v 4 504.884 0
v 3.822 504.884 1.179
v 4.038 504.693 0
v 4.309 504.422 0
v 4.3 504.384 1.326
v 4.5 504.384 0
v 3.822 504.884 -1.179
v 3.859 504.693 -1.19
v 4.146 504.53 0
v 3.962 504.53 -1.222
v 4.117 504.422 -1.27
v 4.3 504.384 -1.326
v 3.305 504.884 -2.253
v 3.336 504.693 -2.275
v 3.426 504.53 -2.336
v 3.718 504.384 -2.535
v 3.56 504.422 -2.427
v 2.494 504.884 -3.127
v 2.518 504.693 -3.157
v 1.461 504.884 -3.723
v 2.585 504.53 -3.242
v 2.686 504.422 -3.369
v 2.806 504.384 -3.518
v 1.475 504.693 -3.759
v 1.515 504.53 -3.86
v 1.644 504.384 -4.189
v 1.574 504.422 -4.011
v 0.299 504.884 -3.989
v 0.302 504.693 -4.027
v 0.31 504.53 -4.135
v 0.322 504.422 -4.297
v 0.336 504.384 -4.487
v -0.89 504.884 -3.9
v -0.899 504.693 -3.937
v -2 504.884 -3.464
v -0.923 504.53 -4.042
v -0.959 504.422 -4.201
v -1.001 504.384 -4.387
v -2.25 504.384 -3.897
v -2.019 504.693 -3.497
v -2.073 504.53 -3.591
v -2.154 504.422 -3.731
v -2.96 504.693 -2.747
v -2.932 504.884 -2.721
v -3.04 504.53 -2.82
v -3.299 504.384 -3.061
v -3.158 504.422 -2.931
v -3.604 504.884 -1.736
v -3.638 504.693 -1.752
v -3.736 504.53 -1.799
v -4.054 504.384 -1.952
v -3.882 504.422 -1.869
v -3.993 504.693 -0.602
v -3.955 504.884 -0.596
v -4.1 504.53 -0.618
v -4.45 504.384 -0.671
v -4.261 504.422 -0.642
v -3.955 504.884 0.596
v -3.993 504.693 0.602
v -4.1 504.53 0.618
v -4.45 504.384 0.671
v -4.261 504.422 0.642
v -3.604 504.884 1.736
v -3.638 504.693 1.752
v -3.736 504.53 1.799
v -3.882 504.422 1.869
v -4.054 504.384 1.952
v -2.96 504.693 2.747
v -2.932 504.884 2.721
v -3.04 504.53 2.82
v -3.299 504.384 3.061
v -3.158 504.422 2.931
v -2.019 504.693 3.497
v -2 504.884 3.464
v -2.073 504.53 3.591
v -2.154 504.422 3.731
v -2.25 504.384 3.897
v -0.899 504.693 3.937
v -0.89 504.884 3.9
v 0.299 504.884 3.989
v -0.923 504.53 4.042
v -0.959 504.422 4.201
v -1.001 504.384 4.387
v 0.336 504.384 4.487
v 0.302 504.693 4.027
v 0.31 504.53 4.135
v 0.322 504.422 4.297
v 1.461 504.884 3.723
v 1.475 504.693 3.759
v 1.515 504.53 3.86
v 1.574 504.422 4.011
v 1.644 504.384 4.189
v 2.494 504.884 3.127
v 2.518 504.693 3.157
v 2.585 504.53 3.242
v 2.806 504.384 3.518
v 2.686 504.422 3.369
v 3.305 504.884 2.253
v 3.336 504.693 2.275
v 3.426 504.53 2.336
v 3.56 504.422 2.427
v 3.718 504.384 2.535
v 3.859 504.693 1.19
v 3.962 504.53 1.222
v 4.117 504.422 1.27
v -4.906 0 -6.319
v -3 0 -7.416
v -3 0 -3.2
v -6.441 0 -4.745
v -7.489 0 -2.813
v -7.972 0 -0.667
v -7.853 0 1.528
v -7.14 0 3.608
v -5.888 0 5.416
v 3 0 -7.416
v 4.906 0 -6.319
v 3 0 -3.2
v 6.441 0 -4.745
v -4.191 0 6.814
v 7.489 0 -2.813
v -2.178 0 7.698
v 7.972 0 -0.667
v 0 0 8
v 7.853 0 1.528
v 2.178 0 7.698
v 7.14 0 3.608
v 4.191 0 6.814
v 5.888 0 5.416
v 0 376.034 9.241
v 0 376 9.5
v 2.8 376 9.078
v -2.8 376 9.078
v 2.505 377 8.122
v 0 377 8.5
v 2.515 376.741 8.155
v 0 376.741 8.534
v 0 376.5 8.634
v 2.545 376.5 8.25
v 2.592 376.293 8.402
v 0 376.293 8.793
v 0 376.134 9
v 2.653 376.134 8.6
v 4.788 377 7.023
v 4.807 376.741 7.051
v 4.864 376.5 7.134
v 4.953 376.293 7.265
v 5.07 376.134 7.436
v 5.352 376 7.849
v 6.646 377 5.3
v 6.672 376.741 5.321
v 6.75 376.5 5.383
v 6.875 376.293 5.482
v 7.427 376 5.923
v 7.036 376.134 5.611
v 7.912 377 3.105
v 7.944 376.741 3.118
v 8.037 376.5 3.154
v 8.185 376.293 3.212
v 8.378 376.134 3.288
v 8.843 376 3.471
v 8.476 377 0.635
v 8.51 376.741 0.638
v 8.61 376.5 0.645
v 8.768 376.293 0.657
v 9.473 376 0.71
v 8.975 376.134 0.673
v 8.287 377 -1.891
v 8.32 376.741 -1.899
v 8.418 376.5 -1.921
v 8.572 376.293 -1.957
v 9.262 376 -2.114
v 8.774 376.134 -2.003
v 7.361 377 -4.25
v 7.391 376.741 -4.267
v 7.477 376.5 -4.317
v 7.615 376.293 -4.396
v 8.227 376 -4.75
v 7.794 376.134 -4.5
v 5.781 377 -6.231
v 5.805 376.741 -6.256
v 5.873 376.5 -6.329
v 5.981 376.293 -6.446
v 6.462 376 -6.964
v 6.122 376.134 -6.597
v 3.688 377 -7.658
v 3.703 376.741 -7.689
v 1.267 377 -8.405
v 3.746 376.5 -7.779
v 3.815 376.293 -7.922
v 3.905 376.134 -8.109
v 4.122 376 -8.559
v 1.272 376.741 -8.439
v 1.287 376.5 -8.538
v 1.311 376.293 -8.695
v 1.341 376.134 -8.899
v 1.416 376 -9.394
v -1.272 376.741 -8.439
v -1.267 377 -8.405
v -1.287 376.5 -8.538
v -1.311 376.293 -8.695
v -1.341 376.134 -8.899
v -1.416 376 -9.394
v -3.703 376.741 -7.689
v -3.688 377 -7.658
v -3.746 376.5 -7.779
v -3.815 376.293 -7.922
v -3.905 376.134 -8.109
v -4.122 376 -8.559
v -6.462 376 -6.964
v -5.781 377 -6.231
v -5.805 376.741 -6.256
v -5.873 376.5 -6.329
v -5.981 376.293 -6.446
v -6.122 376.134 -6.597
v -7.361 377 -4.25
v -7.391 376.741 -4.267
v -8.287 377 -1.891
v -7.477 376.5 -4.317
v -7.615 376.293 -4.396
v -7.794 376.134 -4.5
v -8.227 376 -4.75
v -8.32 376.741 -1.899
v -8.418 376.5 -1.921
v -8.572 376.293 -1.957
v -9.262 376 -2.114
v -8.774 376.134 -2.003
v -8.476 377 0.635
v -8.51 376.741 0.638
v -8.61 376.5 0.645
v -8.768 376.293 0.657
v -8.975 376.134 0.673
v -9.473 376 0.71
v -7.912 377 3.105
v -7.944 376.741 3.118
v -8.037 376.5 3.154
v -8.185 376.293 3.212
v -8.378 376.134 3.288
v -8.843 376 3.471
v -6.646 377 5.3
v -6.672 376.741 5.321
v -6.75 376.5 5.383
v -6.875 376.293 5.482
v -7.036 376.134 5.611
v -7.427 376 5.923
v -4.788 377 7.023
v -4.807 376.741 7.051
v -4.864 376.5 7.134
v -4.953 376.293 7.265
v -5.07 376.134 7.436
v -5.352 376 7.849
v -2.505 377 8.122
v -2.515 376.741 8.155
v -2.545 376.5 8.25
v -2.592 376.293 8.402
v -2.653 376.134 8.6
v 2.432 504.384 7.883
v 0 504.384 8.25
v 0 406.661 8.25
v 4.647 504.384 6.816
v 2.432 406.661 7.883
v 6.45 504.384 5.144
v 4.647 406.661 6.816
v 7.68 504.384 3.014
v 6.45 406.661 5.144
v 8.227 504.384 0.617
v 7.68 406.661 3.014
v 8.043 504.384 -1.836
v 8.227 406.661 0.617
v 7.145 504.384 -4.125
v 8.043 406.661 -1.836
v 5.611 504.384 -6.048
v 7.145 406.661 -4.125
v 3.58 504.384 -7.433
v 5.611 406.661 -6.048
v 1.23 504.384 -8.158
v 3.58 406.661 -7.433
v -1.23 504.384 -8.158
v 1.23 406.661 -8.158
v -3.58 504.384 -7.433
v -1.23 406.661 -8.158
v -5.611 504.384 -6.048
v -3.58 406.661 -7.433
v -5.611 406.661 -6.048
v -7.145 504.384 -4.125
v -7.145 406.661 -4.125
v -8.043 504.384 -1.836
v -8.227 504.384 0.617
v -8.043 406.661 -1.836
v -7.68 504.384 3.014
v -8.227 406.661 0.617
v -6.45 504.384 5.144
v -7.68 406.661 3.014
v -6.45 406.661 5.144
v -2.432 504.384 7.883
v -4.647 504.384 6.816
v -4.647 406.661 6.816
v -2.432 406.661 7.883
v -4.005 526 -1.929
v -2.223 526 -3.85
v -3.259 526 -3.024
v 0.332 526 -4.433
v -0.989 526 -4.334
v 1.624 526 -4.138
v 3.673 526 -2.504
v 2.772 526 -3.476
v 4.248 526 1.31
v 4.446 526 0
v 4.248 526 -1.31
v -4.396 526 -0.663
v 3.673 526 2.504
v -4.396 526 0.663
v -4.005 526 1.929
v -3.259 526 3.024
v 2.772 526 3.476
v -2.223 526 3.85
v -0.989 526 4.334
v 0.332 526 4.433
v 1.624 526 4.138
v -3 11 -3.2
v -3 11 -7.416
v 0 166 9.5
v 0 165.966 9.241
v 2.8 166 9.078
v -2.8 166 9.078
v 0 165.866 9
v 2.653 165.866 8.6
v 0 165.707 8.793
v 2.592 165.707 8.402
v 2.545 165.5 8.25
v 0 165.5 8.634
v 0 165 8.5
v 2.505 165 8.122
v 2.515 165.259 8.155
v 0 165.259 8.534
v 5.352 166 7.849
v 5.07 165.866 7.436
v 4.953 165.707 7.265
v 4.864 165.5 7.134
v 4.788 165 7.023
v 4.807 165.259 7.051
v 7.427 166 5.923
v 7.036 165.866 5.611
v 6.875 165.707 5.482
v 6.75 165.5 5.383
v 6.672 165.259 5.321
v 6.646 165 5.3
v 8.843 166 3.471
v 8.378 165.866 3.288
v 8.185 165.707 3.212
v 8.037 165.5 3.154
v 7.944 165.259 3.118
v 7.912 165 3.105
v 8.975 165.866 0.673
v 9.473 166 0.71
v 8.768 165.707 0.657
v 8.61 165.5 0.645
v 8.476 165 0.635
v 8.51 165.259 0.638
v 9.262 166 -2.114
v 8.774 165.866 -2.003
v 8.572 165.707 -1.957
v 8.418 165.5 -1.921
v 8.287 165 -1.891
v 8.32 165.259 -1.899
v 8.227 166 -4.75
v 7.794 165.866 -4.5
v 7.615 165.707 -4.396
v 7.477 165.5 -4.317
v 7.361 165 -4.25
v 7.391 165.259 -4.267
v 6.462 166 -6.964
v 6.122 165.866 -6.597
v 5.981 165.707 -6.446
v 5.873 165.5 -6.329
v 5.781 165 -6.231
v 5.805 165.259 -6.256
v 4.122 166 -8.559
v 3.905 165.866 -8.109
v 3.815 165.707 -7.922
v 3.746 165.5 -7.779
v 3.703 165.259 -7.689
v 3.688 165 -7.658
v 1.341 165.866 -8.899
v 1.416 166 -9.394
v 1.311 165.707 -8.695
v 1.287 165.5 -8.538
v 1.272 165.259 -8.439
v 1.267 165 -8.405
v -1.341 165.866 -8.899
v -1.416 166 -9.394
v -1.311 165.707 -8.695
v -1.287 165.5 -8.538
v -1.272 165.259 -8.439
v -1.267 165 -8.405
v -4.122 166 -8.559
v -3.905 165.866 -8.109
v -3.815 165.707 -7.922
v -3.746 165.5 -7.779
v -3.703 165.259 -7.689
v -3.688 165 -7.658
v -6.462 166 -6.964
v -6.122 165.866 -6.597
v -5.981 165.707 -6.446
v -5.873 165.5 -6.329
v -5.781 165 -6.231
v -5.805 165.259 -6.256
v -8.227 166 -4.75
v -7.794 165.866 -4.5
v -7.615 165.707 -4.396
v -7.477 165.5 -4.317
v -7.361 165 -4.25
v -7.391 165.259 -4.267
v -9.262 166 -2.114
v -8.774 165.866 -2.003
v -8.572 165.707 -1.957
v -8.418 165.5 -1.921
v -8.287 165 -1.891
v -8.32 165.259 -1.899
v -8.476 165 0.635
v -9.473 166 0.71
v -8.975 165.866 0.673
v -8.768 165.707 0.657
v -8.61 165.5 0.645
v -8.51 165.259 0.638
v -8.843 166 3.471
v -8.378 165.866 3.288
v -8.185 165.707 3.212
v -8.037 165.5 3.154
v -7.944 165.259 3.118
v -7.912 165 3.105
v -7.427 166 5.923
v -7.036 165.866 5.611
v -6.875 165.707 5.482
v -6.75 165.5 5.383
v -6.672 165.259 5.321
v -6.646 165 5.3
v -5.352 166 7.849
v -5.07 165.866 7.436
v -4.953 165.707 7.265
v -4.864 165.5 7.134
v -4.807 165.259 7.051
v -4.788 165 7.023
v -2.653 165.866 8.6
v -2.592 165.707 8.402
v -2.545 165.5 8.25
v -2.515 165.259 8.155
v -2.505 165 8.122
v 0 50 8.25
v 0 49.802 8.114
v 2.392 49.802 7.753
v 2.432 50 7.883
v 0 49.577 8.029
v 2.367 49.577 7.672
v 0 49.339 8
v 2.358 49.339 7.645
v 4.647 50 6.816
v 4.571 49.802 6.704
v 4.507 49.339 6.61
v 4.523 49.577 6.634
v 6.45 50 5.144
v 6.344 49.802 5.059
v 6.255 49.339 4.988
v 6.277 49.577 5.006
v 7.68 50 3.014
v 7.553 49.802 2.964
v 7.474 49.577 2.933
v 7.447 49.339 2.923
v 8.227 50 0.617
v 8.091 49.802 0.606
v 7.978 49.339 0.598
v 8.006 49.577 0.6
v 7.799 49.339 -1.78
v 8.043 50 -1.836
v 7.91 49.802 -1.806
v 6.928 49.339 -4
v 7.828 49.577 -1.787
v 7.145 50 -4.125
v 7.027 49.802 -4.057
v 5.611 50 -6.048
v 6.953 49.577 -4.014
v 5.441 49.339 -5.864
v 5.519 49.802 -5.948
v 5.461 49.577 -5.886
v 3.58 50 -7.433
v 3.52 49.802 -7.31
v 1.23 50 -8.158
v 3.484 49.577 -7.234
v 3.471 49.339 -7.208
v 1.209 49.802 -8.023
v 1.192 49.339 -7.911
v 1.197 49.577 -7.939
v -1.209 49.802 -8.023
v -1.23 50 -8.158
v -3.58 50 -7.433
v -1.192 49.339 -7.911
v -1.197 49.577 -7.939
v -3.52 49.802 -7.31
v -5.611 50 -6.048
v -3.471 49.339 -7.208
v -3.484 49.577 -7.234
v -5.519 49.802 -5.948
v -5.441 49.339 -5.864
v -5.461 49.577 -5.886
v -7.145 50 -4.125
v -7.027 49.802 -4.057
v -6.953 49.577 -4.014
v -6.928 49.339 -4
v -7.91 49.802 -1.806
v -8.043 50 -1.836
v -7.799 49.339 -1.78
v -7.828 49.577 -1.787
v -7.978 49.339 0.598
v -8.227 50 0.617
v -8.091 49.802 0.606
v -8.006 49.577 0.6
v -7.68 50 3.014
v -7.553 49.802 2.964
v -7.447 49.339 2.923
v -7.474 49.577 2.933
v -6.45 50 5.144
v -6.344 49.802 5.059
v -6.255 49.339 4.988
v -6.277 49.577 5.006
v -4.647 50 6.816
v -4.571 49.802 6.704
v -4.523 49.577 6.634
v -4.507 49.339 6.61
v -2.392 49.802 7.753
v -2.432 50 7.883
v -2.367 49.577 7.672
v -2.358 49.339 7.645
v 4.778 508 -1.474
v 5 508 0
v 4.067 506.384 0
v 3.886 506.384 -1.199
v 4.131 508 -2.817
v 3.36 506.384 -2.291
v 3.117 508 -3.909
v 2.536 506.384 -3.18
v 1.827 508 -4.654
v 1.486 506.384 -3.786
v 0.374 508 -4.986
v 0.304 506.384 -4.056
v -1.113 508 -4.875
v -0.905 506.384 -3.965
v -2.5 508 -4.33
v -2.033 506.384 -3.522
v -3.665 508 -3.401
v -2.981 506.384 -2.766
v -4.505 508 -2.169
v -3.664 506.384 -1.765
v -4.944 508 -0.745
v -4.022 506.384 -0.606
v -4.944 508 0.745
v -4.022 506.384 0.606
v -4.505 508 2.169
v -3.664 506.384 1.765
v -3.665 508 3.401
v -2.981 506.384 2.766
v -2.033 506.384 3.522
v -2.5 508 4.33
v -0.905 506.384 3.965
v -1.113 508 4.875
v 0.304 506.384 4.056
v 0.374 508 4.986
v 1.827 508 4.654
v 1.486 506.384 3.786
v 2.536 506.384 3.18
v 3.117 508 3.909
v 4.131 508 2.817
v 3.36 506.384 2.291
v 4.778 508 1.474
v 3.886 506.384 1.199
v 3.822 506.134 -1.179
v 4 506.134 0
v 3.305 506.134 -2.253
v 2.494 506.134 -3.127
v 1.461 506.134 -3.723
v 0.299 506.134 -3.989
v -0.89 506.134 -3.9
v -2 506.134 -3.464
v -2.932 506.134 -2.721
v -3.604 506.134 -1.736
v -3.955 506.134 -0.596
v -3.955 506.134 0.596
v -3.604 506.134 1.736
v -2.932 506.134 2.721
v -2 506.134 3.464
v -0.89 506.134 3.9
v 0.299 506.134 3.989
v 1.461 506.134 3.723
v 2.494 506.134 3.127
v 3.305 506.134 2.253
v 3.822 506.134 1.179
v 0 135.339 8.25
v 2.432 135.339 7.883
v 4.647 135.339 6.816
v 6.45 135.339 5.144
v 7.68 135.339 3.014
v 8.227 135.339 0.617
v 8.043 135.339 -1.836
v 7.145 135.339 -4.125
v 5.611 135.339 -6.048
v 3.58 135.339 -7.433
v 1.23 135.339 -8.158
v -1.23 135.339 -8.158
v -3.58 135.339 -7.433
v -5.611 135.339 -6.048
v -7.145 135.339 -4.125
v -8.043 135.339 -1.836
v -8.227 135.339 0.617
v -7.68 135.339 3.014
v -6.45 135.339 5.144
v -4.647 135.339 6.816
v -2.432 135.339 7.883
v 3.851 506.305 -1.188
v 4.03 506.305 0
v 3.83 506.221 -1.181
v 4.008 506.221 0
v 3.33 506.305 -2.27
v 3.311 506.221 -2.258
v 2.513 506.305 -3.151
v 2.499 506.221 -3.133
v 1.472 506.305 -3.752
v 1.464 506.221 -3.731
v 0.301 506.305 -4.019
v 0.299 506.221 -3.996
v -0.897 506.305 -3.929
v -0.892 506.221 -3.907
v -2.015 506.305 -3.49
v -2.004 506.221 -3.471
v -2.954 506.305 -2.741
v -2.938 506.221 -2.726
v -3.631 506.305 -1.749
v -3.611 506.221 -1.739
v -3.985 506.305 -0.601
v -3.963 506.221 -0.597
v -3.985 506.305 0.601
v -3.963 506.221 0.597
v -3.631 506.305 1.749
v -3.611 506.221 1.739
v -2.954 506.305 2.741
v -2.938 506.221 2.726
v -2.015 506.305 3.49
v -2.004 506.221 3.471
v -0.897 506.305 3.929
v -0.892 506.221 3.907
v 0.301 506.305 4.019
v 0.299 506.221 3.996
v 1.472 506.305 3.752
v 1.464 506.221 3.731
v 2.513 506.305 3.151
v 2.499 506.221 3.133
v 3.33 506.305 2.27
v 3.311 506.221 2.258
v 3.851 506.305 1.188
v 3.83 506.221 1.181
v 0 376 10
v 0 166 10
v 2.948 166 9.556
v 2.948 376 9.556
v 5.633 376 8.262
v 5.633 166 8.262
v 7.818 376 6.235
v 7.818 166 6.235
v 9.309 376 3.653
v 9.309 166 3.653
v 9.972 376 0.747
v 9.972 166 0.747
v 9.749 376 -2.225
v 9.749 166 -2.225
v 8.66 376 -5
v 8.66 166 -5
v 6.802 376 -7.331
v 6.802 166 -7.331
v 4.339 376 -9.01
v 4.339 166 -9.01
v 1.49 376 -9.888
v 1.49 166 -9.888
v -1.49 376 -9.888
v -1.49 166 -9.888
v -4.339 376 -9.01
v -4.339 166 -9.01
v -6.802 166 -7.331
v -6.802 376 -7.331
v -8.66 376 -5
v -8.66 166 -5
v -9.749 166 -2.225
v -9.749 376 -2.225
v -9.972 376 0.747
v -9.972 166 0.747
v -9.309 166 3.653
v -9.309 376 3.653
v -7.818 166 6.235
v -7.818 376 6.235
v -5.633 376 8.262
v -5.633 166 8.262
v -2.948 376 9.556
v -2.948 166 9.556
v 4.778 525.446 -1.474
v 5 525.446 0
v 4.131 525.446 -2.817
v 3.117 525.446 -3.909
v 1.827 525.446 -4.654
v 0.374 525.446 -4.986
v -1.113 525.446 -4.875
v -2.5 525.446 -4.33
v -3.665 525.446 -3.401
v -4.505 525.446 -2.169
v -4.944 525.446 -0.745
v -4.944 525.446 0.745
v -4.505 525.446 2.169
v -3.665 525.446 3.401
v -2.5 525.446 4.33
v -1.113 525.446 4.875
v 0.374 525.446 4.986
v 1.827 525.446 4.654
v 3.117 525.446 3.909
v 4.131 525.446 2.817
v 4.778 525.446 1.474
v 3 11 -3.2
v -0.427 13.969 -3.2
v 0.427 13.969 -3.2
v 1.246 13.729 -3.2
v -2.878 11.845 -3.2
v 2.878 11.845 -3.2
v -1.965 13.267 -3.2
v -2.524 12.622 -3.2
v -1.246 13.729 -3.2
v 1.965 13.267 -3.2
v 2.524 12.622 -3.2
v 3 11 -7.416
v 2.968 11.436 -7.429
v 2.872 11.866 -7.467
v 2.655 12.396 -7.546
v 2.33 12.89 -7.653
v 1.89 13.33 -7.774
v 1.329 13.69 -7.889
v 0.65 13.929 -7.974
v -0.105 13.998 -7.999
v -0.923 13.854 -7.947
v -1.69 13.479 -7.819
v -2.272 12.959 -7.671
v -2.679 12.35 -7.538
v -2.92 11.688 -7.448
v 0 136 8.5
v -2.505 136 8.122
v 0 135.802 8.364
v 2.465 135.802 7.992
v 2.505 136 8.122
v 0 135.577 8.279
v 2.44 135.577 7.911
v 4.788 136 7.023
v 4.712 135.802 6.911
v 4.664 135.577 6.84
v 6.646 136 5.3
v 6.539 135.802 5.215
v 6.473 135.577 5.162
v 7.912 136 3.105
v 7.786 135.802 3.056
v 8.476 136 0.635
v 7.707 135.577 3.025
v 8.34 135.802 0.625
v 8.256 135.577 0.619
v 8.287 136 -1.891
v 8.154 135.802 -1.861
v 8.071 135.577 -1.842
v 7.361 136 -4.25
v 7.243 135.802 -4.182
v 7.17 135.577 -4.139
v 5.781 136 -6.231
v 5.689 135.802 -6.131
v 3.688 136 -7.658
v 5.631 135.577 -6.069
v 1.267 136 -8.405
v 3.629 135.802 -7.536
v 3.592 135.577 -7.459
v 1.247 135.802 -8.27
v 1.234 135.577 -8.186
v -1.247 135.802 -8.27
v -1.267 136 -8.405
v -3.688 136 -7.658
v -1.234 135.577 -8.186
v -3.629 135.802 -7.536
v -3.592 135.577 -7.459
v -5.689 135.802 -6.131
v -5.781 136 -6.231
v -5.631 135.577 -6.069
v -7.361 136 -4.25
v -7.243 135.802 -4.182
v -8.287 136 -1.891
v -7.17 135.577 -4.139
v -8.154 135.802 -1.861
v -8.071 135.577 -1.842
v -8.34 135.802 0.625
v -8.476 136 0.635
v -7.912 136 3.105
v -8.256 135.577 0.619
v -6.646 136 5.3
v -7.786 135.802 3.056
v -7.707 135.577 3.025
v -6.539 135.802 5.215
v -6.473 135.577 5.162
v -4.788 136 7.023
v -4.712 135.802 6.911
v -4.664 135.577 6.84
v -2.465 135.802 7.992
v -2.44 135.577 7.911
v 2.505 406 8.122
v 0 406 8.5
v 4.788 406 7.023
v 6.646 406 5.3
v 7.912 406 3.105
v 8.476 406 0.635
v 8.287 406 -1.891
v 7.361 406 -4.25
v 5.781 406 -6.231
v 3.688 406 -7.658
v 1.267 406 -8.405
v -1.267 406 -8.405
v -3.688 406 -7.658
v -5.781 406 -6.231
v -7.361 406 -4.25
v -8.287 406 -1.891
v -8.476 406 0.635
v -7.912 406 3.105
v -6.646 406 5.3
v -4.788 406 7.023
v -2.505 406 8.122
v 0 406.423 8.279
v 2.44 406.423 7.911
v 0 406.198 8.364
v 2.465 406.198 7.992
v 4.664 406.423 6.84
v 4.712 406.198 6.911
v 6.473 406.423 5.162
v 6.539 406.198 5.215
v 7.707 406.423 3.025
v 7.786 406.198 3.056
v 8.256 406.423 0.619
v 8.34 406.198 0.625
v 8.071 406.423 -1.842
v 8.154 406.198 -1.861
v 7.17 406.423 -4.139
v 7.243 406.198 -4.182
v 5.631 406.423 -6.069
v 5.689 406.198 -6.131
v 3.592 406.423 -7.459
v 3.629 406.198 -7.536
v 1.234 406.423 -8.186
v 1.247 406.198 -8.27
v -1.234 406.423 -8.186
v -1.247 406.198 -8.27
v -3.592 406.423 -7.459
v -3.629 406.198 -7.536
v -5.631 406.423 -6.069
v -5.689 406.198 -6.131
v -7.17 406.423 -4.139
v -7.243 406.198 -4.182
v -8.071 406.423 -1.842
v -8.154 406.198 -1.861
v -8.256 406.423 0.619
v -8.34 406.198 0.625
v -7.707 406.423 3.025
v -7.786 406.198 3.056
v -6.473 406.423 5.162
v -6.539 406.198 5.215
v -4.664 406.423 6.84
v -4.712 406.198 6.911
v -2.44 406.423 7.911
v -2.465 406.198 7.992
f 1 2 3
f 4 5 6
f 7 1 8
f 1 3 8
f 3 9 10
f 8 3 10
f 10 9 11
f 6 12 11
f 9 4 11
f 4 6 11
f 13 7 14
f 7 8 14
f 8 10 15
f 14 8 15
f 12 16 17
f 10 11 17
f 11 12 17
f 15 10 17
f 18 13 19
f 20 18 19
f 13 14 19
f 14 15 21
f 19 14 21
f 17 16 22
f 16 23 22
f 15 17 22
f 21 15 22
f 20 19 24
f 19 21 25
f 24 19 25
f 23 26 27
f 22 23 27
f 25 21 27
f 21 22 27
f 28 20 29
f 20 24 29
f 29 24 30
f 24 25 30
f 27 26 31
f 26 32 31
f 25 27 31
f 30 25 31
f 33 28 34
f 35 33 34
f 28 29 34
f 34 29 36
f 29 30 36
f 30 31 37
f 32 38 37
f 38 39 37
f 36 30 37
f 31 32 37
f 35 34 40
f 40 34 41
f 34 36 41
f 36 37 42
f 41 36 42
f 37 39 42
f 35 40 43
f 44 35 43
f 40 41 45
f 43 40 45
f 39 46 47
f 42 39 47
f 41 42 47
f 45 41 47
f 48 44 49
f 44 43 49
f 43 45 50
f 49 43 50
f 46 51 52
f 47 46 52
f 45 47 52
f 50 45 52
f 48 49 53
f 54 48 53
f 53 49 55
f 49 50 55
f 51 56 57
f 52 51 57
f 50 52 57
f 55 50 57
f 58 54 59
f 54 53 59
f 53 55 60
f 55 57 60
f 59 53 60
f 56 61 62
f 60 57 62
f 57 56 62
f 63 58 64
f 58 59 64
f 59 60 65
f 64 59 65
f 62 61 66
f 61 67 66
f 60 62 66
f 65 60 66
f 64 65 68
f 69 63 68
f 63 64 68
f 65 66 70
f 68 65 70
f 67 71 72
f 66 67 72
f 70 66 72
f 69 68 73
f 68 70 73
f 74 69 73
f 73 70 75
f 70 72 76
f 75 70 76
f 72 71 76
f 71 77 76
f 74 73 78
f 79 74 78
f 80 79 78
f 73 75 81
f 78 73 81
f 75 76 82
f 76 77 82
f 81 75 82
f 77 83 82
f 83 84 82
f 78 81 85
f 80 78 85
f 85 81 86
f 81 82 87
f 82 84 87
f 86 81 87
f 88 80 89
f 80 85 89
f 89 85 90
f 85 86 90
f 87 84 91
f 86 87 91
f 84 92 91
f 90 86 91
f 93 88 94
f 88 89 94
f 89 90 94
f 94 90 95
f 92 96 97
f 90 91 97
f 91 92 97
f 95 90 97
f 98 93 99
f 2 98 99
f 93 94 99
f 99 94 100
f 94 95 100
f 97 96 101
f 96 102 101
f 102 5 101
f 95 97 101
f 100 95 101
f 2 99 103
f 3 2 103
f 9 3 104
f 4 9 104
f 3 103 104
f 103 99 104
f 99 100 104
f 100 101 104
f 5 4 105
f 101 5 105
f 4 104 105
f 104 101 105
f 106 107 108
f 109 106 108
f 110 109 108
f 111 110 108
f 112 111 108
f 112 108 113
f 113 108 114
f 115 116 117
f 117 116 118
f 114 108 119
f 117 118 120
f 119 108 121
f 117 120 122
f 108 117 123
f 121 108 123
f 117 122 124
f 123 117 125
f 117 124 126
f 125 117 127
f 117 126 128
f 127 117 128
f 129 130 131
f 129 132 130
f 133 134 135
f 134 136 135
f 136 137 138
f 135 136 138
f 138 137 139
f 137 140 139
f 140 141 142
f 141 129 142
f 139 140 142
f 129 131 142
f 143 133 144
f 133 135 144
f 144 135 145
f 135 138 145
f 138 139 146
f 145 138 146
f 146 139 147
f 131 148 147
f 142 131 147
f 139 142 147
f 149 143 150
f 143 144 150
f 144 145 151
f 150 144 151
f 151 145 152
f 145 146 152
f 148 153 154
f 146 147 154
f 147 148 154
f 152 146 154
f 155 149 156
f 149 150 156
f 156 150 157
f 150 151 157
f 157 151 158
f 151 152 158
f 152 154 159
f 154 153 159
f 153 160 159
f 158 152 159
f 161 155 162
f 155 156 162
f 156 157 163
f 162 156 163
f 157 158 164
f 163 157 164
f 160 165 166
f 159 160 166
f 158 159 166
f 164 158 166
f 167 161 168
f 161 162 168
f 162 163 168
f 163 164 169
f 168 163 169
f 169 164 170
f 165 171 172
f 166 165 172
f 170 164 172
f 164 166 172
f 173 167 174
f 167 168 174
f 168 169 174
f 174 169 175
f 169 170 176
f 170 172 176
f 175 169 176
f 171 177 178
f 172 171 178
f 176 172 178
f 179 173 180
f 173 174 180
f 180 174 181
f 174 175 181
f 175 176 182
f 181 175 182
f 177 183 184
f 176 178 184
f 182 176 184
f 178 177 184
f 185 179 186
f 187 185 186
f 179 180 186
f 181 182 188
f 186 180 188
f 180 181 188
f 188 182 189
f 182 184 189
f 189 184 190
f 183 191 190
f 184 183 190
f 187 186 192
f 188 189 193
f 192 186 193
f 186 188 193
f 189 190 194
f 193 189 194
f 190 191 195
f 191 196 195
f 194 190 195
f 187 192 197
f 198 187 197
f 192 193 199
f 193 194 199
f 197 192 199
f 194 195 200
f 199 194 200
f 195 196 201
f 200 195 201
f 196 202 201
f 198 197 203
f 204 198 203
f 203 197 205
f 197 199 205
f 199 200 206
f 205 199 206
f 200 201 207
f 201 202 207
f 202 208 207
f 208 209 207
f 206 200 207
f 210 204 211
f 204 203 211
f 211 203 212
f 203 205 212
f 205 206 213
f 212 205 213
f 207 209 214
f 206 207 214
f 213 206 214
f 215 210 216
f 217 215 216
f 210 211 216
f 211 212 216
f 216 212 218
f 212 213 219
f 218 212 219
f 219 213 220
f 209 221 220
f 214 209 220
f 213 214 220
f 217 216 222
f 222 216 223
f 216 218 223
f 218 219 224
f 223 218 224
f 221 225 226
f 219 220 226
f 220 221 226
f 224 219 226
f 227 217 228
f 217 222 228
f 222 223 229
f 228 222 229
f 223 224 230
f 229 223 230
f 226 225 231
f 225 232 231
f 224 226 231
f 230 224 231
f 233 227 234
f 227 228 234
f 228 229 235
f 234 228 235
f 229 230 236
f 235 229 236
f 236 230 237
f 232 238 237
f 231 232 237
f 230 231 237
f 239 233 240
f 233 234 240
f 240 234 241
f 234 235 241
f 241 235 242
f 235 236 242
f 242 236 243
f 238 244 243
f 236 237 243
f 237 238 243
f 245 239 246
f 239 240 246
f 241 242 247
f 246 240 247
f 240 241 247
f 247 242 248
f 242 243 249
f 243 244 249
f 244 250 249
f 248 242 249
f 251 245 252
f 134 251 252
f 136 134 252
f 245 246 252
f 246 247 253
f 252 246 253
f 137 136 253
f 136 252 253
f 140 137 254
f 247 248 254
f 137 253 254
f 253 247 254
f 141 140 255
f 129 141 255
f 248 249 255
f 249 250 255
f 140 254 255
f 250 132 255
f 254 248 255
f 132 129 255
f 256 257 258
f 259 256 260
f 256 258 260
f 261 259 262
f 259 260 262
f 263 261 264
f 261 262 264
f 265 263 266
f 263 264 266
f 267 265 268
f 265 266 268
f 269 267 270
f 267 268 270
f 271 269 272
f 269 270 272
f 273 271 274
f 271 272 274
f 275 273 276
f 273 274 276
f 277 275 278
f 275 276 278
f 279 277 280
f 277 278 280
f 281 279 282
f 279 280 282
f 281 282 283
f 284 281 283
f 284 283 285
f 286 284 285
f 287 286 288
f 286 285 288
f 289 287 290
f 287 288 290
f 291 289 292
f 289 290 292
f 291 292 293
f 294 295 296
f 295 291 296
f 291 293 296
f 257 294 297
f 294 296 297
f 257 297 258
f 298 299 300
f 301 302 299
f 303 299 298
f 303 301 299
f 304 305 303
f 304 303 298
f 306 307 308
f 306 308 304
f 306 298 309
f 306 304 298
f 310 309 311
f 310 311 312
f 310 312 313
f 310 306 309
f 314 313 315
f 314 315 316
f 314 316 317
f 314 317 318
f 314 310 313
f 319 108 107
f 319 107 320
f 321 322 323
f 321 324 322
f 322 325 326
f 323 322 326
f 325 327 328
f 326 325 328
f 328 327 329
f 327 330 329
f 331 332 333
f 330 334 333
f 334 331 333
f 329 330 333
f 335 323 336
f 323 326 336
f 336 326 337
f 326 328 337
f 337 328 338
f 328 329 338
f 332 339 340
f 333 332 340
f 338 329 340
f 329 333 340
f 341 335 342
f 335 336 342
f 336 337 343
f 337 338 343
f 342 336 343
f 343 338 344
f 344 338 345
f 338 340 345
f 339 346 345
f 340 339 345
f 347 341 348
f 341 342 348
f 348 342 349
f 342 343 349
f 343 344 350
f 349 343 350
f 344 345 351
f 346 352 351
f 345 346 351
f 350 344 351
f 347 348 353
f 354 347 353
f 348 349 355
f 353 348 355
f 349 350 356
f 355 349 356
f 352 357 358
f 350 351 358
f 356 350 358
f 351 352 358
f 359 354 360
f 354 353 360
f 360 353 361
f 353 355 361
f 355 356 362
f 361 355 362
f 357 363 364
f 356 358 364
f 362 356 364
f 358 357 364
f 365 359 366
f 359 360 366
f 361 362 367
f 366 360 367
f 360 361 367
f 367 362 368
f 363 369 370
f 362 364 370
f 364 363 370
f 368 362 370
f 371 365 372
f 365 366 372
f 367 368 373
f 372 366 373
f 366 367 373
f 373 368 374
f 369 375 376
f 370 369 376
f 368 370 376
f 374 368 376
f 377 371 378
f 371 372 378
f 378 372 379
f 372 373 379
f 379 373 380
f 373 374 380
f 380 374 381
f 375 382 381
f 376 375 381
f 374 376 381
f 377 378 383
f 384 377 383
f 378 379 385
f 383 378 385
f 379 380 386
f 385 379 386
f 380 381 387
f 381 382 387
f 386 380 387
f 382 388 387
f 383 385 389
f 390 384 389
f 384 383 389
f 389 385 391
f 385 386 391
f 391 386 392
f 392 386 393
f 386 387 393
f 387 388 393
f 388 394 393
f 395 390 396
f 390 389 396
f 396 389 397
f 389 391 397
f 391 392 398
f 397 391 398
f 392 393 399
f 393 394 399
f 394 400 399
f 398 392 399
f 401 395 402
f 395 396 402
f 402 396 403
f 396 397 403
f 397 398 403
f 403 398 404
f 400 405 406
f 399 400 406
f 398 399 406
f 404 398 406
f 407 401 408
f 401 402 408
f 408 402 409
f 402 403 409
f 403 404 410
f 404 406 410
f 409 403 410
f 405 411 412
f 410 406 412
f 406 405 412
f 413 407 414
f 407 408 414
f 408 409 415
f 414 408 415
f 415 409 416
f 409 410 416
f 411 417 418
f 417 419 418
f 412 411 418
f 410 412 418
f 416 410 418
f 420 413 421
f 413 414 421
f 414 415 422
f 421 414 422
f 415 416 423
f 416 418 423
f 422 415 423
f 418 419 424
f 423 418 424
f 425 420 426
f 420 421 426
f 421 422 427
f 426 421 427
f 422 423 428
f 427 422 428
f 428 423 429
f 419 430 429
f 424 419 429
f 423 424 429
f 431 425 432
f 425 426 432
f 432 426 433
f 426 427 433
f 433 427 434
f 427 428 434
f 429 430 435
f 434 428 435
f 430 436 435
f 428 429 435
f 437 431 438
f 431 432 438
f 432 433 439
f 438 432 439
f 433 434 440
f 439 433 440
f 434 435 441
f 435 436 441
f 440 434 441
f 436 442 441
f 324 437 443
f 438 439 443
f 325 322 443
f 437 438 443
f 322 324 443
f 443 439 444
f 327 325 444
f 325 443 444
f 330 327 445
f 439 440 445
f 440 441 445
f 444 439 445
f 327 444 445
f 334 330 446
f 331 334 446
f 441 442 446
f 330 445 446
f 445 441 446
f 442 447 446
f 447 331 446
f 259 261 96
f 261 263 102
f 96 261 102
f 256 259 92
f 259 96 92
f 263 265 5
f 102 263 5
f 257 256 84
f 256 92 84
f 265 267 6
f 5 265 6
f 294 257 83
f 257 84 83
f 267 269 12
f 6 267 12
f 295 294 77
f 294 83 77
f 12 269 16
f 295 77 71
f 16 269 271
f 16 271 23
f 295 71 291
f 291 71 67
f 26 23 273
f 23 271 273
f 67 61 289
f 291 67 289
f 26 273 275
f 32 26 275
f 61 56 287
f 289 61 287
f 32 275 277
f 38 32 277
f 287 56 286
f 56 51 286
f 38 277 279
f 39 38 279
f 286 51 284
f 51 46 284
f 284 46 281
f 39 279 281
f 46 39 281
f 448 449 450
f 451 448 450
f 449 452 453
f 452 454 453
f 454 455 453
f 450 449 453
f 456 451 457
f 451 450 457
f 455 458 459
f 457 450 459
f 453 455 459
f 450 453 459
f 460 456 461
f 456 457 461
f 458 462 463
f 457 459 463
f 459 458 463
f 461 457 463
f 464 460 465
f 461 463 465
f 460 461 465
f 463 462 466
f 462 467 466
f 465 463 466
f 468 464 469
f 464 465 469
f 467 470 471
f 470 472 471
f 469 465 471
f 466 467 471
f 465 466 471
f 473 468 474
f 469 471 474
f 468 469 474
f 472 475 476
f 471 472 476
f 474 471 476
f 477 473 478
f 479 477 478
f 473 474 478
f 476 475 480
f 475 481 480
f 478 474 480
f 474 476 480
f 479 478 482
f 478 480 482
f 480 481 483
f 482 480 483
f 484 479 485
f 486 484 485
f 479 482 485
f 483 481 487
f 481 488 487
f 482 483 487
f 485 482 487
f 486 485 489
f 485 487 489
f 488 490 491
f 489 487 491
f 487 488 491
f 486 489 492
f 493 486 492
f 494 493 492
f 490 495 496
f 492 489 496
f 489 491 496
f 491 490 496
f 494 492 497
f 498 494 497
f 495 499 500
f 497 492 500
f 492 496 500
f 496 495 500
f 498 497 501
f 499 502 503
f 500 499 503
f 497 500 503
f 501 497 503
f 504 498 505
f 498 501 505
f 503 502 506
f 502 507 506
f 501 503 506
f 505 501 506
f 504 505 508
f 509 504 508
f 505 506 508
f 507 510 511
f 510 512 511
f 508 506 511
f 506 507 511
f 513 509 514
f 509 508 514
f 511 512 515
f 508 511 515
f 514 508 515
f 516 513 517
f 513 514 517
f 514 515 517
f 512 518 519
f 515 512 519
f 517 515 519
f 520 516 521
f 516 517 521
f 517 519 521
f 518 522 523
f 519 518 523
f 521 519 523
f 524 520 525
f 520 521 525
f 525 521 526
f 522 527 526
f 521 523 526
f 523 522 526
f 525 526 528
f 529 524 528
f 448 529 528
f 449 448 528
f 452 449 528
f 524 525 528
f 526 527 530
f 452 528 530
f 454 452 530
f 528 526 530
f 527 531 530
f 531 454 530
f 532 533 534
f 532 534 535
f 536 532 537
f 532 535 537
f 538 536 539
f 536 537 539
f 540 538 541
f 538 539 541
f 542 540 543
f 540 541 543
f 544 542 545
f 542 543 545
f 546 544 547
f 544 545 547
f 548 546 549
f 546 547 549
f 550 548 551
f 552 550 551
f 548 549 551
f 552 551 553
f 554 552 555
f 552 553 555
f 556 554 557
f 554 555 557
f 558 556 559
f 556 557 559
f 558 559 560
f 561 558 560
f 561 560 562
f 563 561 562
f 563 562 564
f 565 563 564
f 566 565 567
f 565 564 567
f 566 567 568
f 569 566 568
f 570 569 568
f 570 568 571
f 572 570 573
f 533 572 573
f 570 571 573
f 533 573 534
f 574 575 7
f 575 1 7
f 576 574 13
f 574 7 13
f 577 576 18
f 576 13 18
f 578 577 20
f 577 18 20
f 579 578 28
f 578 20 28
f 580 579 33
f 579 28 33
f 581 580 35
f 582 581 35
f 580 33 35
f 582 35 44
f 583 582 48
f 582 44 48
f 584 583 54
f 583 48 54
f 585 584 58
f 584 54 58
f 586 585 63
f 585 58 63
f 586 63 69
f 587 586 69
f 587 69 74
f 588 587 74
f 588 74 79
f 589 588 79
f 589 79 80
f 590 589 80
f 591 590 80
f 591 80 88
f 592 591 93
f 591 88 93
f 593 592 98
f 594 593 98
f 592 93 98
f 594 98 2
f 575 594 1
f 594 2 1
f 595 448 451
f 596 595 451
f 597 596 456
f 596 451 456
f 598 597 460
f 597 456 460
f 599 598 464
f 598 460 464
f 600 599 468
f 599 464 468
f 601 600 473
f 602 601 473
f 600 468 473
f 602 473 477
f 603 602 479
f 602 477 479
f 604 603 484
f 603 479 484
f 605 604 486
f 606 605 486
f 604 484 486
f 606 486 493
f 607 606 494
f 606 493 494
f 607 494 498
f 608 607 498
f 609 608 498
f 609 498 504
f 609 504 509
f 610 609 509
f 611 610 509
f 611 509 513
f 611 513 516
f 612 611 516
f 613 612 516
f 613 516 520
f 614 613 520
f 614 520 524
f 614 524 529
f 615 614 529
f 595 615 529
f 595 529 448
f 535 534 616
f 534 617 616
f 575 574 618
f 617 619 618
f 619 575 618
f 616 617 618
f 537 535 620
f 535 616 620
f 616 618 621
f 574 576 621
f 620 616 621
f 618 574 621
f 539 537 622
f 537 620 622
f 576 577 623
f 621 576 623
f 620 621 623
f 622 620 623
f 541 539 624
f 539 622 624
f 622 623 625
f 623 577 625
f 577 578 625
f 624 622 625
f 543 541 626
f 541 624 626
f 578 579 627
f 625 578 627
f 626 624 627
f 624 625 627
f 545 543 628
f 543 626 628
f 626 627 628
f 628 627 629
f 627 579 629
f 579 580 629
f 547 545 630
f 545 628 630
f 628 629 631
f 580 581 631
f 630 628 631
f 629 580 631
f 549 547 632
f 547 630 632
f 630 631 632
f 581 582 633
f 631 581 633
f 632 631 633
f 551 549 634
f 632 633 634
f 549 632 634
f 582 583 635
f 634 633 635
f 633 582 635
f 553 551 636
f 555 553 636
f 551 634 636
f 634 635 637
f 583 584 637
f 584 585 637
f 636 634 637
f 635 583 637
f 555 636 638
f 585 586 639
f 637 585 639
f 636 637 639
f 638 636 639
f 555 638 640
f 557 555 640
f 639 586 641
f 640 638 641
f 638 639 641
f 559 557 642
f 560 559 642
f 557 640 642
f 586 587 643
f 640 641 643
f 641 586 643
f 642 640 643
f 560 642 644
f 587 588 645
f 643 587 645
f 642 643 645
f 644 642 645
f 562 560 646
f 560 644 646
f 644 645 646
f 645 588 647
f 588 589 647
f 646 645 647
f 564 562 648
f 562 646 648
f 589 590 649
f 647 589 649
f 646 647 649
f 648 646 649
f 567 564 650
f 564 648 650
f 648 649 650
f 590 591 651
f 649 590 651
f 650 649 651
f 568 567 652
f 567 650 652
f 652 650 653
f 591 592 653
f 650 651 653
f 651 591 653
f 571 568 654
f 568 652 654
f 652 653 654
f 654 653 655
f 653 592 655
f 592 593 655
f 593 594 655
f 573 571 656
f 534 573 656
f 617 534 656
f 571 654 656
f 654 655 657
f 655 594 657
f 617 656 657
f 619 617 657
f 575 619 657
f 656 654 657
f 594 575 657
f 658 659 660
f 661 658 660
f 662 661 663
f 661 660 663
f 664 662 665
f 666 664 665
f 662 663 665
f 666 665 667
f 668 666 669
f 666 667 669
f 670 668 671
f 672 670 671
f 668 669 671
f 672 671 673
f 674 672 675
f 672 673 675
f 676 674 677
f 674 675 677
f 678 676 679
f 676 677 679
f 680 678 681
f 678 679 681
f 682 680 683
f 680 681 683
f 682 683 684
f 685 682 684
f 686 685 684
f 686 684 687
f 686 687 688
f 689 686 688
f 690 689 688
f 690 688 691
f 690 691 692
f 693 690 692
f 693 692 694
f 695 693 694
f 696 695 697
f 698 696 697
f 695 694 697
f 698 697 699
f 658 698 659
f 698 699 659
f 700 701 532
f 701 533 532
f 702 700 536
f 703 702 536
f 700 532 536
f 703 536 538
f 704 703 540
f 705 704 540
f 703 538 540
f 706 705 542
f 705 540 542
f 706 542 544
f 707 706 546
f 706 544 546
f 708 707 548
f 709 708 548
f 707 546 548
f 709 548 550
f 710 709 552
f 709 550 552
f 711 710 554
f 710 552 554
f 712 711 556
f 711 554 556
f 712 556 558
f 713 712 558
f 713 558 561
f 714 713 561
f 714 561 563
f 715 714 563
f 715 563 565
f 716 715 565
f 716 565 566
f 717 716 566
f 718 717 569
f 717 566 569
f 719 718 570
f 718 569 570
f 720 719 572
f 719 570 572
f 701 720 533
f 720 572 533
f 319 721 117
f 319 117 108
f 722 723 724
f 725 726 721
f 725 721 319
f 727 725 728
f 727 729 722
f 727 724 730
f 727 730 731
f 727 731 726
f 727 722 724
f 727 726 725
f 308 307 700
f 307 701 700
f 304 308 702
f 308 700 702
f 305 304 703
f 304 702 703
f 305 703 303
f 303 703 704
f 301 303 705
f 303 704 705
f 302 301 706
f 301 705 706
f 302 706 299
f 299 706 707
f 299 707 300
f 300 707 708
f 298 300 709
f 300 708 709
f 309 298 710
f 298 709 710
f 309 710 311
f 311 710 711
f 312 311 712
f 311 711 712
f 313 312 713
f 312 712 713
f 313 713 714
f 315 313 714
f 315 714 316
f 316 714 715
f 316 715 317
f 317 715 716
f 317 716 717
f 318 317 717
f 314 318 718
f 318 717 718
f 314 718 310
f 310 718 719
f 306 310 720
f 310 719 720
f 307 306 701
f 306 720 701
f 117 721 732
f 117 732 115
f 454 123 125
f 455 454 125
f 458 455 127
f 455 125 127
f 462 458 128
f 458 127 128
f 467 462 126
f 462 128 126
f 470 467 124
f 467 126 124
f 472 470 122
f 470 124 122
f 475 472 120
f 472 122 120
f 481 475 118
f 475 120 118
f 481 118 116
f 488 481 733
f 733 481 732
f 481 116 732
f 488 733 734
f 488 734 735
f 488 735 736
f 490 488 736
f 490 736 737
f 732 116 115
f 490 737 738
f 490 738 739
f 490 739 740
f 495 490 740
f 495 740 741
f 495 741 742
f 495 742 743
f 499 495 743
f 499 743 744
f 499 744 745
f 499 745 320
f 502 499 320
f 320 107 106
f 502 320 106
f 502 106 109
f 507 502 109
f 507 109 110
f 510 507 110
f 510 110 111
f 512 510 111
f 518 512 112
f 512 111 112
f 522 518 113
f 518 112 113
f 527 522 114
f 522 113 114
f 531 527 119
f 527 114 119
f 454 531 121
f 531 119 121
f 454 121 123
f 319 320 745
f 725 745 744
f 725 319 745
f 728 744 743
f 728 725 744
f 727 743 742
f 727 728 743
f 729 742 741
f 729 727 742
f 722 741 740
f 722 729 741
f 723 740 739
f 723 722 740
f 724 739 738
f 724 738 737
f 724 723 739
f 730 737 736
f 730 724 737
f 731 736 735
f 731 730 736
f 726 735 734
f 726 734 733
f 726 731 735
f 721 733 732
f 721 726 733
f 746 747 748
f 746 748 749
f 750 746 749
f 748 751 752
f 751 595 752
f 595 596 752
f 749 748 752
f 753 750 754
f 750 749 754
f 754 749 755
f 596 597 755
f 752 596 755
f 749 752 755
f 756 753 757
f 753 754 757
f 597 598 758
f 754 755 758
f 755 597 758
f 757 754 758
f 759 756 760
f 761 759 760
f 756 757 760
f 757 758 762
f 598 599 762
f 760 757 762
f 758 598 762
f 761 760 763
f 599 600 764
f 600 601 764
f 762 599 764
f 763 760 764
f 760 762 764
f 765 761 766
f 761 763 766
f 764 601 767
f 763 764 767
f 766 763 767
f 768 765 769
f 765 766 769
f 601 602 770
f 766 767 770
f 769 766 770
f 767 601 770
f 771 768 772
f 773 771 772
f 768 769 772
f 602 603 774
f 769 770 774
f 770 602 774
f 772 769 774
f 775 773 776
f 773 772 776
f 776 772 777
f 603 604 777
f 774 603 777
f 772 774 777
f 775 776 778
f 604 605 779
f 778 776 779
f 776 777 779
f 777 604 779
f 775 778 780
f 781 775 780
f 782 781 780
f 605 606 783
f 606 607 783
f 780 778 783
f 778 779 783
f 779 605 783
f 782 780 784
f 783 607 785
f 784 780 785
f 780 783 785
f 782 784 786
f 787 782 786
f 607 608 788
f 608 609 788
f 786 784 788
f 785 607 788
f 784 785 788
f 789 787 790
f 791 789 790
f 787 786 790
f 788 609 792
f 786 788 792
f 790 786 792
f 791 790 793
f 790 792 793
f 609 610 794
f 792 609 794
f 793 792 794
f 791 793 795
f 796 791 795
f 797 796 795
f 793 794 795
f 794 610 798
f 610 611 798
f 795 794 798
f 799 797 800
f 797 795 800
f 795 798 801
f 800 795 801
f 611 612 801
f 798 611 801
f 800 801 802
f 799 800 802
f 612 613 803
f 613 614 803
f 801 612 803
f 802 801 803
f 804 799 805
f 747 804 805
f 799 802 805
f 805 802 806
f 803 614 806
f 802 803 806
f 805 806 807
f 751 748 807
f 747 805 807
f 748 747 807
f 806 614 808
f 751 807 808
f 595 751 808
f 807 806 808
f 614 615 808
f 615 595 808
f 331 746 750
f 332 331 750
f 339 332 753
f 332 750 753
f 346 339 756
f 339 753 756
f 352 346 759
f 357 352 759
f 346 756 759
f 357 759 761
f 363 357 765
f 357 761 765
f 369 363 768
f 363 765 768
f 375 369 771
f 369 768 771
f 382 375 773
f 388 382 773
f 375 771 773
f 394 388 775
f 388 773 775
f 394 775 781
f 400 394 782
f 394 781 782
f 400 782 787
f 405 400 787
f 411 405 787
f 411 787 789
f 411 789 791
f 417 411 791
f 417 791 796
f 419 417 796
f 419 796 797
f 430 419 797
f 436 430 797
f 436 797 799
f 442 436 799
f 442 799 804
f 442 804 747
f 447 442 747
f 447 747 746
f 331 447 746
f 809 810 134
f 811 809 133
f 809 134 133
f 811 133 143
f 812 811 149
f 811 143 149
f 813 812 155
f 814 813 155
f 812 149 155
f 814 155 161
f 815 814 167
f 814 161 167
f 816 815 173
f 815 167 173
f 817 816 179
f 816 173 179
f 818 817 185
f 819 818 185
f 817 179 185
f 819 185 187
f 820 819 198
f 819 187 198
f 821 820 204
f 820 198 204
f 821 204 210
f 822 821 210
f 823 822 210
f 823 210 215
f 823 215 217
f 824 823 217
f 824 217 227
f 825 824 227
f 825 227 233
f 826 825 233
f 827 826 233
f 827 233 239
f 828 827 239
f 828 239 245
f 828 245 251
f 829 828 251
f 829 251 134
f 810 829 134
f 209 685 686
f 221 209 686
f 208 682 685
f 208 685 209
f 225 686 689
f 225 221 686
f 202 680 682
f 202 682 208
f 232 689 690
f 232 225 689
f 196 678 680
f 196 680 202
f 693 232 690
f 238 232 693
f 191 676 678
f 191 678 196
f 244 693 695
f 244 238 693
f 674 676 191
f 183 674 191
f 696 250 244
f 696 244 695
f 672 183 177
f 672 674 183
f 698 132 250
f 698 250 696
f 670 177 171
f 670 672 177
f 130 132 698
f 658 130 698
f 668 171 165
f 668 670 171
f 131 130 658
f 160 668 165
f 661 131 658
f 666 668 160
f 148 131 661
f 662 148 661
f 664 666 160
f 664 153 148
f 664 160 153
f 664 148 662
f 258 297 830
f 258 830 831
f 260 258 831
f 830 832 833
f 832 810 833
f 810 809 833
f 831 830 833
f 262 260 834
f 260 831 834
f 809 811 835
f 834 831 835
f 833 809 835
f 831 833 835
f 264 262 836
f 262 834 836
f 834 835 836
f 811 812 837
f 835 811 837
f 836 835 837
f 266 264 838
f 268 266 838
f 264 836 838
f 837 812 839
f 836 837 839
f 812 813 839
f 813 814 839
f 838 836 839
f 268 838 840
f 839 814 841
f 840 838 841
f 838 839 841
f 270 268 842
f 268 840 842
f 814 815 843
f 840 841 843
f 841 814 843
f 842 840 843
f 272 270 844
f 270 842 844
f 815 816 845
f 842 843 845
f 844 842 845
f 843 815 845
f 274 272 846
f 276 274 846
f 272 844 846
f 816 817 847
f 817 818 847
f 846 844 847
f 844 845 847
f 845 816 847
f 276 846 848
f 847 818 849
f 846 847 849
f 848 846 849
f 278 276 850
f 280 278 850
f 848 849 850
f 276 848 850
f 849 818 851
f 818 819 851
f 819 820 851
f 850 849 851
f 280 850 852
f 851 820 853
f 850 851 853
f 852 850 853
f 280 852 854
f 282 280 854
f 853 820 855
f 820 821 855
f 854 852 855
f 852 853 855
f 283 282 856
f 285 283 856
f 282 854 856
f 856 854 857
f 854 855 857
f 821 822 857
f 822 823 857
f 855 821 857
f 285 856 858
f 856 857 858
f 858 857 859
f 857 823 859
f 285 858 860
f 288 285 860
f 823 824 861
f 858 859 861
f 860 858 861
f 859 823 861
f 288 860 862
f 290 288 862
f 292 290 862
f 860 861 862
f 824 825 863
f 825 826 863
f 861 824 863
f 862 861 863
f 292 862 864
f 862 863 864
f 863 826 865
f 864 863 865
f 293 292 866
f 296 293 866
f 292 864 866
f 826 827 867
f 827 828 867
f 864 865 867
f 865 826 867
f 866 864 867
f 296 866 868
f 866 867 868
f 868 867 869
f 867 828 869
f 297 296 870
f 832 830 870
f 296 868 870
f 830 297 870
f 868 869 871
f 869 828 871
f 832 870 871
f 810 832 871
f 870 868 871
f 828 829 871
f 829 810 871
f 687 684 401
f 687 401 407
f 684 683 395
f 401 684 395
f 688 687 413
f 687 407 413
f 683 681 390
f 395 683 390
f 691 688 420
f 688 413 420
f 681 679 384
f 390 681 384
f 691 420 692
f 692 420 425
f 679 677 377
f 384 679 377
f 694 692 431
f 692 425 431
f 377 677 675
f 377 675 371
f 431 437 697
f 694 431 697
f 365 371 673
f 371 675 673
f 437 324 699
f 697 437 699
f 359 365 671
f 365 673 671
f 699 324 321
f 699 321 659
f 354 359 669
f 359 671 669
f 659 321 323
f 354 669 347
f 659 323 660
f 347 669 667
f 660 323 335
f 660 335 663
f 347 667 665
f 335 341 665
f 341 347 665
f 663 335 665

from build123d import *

# Parameters (mm, degrees)
SKETCH1_R           = 8
BOSS_EXTRUDE1_DEPTH = 50
SKETCH2_R           = 8.25
BOSS_EXTRUDE2_DEPTH = 86
SKETCH3_R           = 8.5
BOSS_EXTRUDE3_DEPTH = 30
SKETCH4_R           = 10
BOSS_EXTRUDE4_DEPTH = 210
SKETCH5_R           = 8.5
BOSS_EXTRUDE5_DEPTH = 30
SKETCH6_R           = 8.25
BOSS_EXTRUDE6_DEPTH = 95
SKETCH32_R          = 8.25
BOSS_EXTRUDE7_DEPTH = 25
CUT_EXTRUDE1_START  = -3.2
CUT_EXTRUDE1_DEPTH  = 523.990079724
FILLET1_R           = 1


# Read off the part's stored shape, not the designer's step: M10x1.0 Machine Threads Stud1
with BuildPart() as part:
    # Sketch1 → Boss-Extrude1 (new body)
    with BuildSketch(Plane(origin=(0, 0, 0), x_dir=(1, 0, 0), z_dir=(0, 1, 0))):
        with Locations(Location((0, 0, 0), (0, 0, 270))):
            Circle(SKETCH1_R)
    extrude(amount=BOSS_EXTRUDE1_DEPTH)

    # Sketch2 → Boss-Extrude2 (add)
    with BuildSketch(Plane(origin=(0, 50, 0), x_dir=(1, 0, 0), z_dir=(0, 1, 0))):
        with Locations(Location((0, 0, 0), (0, 0, 270))):
            Circle(SKETCH2_R)
    extrude(amount=BOSS_EXTRUDE2_DEPTH)

    # Sketch3 → Boss-Extrude3 (add)
    with BuildSketch(Plane(origin=(0, 136, 0), x_dir=(1, 0, 0), z_dir=(0, 1, 0))):
        with Locations(Location((0, 0, 0), (0, 0, 270))):
            Circle(SKETCH3_R)
    extrude(amount=BOSS_EXTRUDE3_DEPTH)

    # Sketch4 → Boss-Extrude4 (add)
    with BuildSketch(Plane(origin=(0, 166, 0), x_dir=(1, 0, 0), z_dir=(0, 1, 0))):
        with Locations(Location((0, 0, 0), (0, 0, 270))):
            Circle(SKETCH4_R)
    extrude(amount=BOSS_EXTRUDE4_DEPTH)

    # Sketch5 → Boss-Extrude5 (add)
    with BuildSketch(Plane(origin=(0, 376, 0), x_dir=(1, 0, 0), z_dir=(0, 1, 0))):
        with Locations(Location((0, 0, 0), (0, 0, 270))):
            Circle(SKETCH5_R)
    extrude(amount=BOSS_EXTRUDE5_DEPTH)

    # Sketch6 → Boss-Extrude6 (add)
    with BuildSketch(Plane(origin=(0, 406, 0), x_dir=(1, 0, 0), z_dir=(0, 1, 0))):
        with Locations(Location((0, 0, 0), (0, 0, 270))):
            Circle(SKETCH6_R)
    extrude(amount=BOSS_EXTRUDE6_DEPTH)

    # Sketch32 → Boss-Extrude7 (add)
    with BuildSketch(Plane(origin=(0, 501, 0), x_dir=(1, 0, 0), z_dir=(0, 1, 0))):
        with Locations(Location((0, 0, 0), (0, 0, 270))):
            Circle(SKETCH32_R)
    extrude(amount=BOSS_EXTRUDE7_DEPTH)

    # M10x1.0 Machine Threads Stud1 outline → M10x1.0 Machine Threads Stud1 (revolve, cut)
    with BuildSketch(Plane.XY):
        with BuildLine():
            Line((8.25, 526), (4.4455, 526))
            Line((4.4455, 526), (5, 525.4455))
            Line((5, 525.4455), (5, 508))
            Line((5, 508), (4.066987298, 506.383974596))
            ThreePointArc((4.066987298, 506.383974596), (4.017037087, 506.263384119), (4, 506.133974596))
            Line((4, 506.133974596), (4, 504.883974596))
            ThreePointArc((4, 504.883974596), (4.14644661, 504.530421205), (4.5, 504.383974596))
            Line((4.5, 504.383974596), (8.25, 504.383974596))
            Line((8.25, 504.383974596), (8.25, 526))
        make_face()
    revolve(axis=Axis((0, 0, 0), (0, 1, 0)), mode=Mode.SUBTRACT)

    # Sketch34 → Cut-Extrude1 (cut, through all)
    with BuildSketch(Plane.XY.offset(CUT_EXTRUDE1_START)):
        with BuildLine():
            Line((3, -11), (-3, -11))
            Line((-3, -11), (-3, 11))
            ThreePointArc((-3, 11), (0, 14), (3, 11))
            Line((3, 11), (3, -11))
        make_face()
    extrude(amount=-CUT_EXTRUDE1_DEPTH, mode=Mode.SUBTRACT)

    # Fillet1
    # the kernel refuses this fillet: 1 mm, written as the material it adds along each edge
    with BuildSketch(Plane(origin=(0, 376, 0), x_dir=(0, 0, 1), z_dir=(-1, 0, 0))) as fillet1_piece_1:
        with BuildLine():
            CenterArc((8.5 + FILLET1_R, FILLET1_R), FILLET1_R, 180, 90)
            Line((8.5, FILLET1_R), (8.5 - FILLET1_R * 0.02, FILLET1_R))
            Line((8.5 - FILLET1_R * 0.02, FILLET1_R), (8.5 - FILLET1_R * 0.02, -FILLET1_R * 0.02))
            Line((8.5 - FILLET1_R * 0.02, -FILLET1_R * 0.02), (8.5 + FILLET1_R, -FILLET1_R * 0.02))
            Line((8.5 + FILLET1_R, -FILLET1_R * 0.02), (8.5 + FILLET1_R, 0))
        make_face()
    revolve(axis=Axis((0, 376, 0), (0, 1, 0)))
    with BuildSketch(Plane(origin=(0, 406, 0), x_dir=(0, 0, 1), z_dir=(-1, 0, 0))) as fillet1_piece_2:
        with BuildLine():
            CenterArc((9.25, 0.661437828), FILLET1_R, 180, 41.409622109)
            Line((8.25, 0.661437828), (8.23, 0.661437828))
            Line((8.23, 0.661437828), (8.23, 0))
            Line((8.23, 0), (8.25, -0.02))
            ThreePointArc((8.25, -0.02), (8.375, -0.02), (8.485, -0.013228757))
            Line((8.485, -0.013228757), (8.5, 0))
        make_face()
    revolve(axis=Axis((0, 406, 0), (0, 1, 0)))
    with BuildSketch(Plane(origin=(0, 50, 0), x_dir=(0, 0, 1), z_dir=(-1, 0, 0))) as fillet1_piece_3:
        with BuildLine():
            CenterArc((9, -0.661437828), FILLET1_R, 138.590377891, 41.409622109)
            Line((8, -0.661437828), (7.98, -0.661437828))
            Line((7.98, -0.661437828), (7.98, 0))
            Line((7.98, 0), (8, 0.02))
            ThreePointArc((8, 0.02), (8.125, 0.02), (8.235, 0.013228757))
            Line((8.235, 0.013228757), (8.25, 0))
        make_face()
    revolve(axis=Axis((0, 50, 0), (0, 1, 0)))
    with BuildSketch(Plane(origin=(0, 136, 0), x_dir=(0, 0, 1), z_dir=(-1, 0, 0))) as fillet1_piece_4:
        with BuildLine():
            CenterArc((9.25, -0.661437828), FILLET1_R, 138.590377891, 41.409622109)
            Line((8.25, -0.661437828), (8.23, -0.661437828))
            Line((8.23, -0.661437828), (8.23, 0))
            Line((8.23, 0), (8.25, 0.02))
            ThreePointArc((8.25, 0.02), (8.375, 0.02), (8.485, 0.013228757))
            Line((8.485, 0.013228757), (8.5, 0))
        make_face()
    revolve(axis=Axis((0, 136, 0), (0, 1, 0)))
    with BuildSketch(Plane(origin=(0, 166, 0), x_dir=(0, 0, 1), z_dir=(-1, 0, 0))) as fillet1_piece_5:
        with BuildLine():
            CenterArc((8.5 + FILLET1_R, -FILLET1_R), FILLET1_R, 90, 90)
            Line((8.5, -FILLET1_R), (8.5 - FILLET1_R * 0.02, -FILLET1_R))
            Line((8.5 - FILLET1_R * 0.02, -FILLET1_R), (8.5 - FILLET1_R * 0.02, FILLET1_R * 0.02))
            Line((8.5 - FILLET1_R * 0.02, FILLET1_R * 0.02), (8.5 + FILLET1_R, FILLET1_R * 0.02))
            Line((8.5 + FILLET1_R, FILLET1_R * 0.02), (8.5 + FILLET1_R, 0))
        make_face()
    revolve(axis=Axis((0, 166, 0), (0, 1, 0)))


solid = part.part
